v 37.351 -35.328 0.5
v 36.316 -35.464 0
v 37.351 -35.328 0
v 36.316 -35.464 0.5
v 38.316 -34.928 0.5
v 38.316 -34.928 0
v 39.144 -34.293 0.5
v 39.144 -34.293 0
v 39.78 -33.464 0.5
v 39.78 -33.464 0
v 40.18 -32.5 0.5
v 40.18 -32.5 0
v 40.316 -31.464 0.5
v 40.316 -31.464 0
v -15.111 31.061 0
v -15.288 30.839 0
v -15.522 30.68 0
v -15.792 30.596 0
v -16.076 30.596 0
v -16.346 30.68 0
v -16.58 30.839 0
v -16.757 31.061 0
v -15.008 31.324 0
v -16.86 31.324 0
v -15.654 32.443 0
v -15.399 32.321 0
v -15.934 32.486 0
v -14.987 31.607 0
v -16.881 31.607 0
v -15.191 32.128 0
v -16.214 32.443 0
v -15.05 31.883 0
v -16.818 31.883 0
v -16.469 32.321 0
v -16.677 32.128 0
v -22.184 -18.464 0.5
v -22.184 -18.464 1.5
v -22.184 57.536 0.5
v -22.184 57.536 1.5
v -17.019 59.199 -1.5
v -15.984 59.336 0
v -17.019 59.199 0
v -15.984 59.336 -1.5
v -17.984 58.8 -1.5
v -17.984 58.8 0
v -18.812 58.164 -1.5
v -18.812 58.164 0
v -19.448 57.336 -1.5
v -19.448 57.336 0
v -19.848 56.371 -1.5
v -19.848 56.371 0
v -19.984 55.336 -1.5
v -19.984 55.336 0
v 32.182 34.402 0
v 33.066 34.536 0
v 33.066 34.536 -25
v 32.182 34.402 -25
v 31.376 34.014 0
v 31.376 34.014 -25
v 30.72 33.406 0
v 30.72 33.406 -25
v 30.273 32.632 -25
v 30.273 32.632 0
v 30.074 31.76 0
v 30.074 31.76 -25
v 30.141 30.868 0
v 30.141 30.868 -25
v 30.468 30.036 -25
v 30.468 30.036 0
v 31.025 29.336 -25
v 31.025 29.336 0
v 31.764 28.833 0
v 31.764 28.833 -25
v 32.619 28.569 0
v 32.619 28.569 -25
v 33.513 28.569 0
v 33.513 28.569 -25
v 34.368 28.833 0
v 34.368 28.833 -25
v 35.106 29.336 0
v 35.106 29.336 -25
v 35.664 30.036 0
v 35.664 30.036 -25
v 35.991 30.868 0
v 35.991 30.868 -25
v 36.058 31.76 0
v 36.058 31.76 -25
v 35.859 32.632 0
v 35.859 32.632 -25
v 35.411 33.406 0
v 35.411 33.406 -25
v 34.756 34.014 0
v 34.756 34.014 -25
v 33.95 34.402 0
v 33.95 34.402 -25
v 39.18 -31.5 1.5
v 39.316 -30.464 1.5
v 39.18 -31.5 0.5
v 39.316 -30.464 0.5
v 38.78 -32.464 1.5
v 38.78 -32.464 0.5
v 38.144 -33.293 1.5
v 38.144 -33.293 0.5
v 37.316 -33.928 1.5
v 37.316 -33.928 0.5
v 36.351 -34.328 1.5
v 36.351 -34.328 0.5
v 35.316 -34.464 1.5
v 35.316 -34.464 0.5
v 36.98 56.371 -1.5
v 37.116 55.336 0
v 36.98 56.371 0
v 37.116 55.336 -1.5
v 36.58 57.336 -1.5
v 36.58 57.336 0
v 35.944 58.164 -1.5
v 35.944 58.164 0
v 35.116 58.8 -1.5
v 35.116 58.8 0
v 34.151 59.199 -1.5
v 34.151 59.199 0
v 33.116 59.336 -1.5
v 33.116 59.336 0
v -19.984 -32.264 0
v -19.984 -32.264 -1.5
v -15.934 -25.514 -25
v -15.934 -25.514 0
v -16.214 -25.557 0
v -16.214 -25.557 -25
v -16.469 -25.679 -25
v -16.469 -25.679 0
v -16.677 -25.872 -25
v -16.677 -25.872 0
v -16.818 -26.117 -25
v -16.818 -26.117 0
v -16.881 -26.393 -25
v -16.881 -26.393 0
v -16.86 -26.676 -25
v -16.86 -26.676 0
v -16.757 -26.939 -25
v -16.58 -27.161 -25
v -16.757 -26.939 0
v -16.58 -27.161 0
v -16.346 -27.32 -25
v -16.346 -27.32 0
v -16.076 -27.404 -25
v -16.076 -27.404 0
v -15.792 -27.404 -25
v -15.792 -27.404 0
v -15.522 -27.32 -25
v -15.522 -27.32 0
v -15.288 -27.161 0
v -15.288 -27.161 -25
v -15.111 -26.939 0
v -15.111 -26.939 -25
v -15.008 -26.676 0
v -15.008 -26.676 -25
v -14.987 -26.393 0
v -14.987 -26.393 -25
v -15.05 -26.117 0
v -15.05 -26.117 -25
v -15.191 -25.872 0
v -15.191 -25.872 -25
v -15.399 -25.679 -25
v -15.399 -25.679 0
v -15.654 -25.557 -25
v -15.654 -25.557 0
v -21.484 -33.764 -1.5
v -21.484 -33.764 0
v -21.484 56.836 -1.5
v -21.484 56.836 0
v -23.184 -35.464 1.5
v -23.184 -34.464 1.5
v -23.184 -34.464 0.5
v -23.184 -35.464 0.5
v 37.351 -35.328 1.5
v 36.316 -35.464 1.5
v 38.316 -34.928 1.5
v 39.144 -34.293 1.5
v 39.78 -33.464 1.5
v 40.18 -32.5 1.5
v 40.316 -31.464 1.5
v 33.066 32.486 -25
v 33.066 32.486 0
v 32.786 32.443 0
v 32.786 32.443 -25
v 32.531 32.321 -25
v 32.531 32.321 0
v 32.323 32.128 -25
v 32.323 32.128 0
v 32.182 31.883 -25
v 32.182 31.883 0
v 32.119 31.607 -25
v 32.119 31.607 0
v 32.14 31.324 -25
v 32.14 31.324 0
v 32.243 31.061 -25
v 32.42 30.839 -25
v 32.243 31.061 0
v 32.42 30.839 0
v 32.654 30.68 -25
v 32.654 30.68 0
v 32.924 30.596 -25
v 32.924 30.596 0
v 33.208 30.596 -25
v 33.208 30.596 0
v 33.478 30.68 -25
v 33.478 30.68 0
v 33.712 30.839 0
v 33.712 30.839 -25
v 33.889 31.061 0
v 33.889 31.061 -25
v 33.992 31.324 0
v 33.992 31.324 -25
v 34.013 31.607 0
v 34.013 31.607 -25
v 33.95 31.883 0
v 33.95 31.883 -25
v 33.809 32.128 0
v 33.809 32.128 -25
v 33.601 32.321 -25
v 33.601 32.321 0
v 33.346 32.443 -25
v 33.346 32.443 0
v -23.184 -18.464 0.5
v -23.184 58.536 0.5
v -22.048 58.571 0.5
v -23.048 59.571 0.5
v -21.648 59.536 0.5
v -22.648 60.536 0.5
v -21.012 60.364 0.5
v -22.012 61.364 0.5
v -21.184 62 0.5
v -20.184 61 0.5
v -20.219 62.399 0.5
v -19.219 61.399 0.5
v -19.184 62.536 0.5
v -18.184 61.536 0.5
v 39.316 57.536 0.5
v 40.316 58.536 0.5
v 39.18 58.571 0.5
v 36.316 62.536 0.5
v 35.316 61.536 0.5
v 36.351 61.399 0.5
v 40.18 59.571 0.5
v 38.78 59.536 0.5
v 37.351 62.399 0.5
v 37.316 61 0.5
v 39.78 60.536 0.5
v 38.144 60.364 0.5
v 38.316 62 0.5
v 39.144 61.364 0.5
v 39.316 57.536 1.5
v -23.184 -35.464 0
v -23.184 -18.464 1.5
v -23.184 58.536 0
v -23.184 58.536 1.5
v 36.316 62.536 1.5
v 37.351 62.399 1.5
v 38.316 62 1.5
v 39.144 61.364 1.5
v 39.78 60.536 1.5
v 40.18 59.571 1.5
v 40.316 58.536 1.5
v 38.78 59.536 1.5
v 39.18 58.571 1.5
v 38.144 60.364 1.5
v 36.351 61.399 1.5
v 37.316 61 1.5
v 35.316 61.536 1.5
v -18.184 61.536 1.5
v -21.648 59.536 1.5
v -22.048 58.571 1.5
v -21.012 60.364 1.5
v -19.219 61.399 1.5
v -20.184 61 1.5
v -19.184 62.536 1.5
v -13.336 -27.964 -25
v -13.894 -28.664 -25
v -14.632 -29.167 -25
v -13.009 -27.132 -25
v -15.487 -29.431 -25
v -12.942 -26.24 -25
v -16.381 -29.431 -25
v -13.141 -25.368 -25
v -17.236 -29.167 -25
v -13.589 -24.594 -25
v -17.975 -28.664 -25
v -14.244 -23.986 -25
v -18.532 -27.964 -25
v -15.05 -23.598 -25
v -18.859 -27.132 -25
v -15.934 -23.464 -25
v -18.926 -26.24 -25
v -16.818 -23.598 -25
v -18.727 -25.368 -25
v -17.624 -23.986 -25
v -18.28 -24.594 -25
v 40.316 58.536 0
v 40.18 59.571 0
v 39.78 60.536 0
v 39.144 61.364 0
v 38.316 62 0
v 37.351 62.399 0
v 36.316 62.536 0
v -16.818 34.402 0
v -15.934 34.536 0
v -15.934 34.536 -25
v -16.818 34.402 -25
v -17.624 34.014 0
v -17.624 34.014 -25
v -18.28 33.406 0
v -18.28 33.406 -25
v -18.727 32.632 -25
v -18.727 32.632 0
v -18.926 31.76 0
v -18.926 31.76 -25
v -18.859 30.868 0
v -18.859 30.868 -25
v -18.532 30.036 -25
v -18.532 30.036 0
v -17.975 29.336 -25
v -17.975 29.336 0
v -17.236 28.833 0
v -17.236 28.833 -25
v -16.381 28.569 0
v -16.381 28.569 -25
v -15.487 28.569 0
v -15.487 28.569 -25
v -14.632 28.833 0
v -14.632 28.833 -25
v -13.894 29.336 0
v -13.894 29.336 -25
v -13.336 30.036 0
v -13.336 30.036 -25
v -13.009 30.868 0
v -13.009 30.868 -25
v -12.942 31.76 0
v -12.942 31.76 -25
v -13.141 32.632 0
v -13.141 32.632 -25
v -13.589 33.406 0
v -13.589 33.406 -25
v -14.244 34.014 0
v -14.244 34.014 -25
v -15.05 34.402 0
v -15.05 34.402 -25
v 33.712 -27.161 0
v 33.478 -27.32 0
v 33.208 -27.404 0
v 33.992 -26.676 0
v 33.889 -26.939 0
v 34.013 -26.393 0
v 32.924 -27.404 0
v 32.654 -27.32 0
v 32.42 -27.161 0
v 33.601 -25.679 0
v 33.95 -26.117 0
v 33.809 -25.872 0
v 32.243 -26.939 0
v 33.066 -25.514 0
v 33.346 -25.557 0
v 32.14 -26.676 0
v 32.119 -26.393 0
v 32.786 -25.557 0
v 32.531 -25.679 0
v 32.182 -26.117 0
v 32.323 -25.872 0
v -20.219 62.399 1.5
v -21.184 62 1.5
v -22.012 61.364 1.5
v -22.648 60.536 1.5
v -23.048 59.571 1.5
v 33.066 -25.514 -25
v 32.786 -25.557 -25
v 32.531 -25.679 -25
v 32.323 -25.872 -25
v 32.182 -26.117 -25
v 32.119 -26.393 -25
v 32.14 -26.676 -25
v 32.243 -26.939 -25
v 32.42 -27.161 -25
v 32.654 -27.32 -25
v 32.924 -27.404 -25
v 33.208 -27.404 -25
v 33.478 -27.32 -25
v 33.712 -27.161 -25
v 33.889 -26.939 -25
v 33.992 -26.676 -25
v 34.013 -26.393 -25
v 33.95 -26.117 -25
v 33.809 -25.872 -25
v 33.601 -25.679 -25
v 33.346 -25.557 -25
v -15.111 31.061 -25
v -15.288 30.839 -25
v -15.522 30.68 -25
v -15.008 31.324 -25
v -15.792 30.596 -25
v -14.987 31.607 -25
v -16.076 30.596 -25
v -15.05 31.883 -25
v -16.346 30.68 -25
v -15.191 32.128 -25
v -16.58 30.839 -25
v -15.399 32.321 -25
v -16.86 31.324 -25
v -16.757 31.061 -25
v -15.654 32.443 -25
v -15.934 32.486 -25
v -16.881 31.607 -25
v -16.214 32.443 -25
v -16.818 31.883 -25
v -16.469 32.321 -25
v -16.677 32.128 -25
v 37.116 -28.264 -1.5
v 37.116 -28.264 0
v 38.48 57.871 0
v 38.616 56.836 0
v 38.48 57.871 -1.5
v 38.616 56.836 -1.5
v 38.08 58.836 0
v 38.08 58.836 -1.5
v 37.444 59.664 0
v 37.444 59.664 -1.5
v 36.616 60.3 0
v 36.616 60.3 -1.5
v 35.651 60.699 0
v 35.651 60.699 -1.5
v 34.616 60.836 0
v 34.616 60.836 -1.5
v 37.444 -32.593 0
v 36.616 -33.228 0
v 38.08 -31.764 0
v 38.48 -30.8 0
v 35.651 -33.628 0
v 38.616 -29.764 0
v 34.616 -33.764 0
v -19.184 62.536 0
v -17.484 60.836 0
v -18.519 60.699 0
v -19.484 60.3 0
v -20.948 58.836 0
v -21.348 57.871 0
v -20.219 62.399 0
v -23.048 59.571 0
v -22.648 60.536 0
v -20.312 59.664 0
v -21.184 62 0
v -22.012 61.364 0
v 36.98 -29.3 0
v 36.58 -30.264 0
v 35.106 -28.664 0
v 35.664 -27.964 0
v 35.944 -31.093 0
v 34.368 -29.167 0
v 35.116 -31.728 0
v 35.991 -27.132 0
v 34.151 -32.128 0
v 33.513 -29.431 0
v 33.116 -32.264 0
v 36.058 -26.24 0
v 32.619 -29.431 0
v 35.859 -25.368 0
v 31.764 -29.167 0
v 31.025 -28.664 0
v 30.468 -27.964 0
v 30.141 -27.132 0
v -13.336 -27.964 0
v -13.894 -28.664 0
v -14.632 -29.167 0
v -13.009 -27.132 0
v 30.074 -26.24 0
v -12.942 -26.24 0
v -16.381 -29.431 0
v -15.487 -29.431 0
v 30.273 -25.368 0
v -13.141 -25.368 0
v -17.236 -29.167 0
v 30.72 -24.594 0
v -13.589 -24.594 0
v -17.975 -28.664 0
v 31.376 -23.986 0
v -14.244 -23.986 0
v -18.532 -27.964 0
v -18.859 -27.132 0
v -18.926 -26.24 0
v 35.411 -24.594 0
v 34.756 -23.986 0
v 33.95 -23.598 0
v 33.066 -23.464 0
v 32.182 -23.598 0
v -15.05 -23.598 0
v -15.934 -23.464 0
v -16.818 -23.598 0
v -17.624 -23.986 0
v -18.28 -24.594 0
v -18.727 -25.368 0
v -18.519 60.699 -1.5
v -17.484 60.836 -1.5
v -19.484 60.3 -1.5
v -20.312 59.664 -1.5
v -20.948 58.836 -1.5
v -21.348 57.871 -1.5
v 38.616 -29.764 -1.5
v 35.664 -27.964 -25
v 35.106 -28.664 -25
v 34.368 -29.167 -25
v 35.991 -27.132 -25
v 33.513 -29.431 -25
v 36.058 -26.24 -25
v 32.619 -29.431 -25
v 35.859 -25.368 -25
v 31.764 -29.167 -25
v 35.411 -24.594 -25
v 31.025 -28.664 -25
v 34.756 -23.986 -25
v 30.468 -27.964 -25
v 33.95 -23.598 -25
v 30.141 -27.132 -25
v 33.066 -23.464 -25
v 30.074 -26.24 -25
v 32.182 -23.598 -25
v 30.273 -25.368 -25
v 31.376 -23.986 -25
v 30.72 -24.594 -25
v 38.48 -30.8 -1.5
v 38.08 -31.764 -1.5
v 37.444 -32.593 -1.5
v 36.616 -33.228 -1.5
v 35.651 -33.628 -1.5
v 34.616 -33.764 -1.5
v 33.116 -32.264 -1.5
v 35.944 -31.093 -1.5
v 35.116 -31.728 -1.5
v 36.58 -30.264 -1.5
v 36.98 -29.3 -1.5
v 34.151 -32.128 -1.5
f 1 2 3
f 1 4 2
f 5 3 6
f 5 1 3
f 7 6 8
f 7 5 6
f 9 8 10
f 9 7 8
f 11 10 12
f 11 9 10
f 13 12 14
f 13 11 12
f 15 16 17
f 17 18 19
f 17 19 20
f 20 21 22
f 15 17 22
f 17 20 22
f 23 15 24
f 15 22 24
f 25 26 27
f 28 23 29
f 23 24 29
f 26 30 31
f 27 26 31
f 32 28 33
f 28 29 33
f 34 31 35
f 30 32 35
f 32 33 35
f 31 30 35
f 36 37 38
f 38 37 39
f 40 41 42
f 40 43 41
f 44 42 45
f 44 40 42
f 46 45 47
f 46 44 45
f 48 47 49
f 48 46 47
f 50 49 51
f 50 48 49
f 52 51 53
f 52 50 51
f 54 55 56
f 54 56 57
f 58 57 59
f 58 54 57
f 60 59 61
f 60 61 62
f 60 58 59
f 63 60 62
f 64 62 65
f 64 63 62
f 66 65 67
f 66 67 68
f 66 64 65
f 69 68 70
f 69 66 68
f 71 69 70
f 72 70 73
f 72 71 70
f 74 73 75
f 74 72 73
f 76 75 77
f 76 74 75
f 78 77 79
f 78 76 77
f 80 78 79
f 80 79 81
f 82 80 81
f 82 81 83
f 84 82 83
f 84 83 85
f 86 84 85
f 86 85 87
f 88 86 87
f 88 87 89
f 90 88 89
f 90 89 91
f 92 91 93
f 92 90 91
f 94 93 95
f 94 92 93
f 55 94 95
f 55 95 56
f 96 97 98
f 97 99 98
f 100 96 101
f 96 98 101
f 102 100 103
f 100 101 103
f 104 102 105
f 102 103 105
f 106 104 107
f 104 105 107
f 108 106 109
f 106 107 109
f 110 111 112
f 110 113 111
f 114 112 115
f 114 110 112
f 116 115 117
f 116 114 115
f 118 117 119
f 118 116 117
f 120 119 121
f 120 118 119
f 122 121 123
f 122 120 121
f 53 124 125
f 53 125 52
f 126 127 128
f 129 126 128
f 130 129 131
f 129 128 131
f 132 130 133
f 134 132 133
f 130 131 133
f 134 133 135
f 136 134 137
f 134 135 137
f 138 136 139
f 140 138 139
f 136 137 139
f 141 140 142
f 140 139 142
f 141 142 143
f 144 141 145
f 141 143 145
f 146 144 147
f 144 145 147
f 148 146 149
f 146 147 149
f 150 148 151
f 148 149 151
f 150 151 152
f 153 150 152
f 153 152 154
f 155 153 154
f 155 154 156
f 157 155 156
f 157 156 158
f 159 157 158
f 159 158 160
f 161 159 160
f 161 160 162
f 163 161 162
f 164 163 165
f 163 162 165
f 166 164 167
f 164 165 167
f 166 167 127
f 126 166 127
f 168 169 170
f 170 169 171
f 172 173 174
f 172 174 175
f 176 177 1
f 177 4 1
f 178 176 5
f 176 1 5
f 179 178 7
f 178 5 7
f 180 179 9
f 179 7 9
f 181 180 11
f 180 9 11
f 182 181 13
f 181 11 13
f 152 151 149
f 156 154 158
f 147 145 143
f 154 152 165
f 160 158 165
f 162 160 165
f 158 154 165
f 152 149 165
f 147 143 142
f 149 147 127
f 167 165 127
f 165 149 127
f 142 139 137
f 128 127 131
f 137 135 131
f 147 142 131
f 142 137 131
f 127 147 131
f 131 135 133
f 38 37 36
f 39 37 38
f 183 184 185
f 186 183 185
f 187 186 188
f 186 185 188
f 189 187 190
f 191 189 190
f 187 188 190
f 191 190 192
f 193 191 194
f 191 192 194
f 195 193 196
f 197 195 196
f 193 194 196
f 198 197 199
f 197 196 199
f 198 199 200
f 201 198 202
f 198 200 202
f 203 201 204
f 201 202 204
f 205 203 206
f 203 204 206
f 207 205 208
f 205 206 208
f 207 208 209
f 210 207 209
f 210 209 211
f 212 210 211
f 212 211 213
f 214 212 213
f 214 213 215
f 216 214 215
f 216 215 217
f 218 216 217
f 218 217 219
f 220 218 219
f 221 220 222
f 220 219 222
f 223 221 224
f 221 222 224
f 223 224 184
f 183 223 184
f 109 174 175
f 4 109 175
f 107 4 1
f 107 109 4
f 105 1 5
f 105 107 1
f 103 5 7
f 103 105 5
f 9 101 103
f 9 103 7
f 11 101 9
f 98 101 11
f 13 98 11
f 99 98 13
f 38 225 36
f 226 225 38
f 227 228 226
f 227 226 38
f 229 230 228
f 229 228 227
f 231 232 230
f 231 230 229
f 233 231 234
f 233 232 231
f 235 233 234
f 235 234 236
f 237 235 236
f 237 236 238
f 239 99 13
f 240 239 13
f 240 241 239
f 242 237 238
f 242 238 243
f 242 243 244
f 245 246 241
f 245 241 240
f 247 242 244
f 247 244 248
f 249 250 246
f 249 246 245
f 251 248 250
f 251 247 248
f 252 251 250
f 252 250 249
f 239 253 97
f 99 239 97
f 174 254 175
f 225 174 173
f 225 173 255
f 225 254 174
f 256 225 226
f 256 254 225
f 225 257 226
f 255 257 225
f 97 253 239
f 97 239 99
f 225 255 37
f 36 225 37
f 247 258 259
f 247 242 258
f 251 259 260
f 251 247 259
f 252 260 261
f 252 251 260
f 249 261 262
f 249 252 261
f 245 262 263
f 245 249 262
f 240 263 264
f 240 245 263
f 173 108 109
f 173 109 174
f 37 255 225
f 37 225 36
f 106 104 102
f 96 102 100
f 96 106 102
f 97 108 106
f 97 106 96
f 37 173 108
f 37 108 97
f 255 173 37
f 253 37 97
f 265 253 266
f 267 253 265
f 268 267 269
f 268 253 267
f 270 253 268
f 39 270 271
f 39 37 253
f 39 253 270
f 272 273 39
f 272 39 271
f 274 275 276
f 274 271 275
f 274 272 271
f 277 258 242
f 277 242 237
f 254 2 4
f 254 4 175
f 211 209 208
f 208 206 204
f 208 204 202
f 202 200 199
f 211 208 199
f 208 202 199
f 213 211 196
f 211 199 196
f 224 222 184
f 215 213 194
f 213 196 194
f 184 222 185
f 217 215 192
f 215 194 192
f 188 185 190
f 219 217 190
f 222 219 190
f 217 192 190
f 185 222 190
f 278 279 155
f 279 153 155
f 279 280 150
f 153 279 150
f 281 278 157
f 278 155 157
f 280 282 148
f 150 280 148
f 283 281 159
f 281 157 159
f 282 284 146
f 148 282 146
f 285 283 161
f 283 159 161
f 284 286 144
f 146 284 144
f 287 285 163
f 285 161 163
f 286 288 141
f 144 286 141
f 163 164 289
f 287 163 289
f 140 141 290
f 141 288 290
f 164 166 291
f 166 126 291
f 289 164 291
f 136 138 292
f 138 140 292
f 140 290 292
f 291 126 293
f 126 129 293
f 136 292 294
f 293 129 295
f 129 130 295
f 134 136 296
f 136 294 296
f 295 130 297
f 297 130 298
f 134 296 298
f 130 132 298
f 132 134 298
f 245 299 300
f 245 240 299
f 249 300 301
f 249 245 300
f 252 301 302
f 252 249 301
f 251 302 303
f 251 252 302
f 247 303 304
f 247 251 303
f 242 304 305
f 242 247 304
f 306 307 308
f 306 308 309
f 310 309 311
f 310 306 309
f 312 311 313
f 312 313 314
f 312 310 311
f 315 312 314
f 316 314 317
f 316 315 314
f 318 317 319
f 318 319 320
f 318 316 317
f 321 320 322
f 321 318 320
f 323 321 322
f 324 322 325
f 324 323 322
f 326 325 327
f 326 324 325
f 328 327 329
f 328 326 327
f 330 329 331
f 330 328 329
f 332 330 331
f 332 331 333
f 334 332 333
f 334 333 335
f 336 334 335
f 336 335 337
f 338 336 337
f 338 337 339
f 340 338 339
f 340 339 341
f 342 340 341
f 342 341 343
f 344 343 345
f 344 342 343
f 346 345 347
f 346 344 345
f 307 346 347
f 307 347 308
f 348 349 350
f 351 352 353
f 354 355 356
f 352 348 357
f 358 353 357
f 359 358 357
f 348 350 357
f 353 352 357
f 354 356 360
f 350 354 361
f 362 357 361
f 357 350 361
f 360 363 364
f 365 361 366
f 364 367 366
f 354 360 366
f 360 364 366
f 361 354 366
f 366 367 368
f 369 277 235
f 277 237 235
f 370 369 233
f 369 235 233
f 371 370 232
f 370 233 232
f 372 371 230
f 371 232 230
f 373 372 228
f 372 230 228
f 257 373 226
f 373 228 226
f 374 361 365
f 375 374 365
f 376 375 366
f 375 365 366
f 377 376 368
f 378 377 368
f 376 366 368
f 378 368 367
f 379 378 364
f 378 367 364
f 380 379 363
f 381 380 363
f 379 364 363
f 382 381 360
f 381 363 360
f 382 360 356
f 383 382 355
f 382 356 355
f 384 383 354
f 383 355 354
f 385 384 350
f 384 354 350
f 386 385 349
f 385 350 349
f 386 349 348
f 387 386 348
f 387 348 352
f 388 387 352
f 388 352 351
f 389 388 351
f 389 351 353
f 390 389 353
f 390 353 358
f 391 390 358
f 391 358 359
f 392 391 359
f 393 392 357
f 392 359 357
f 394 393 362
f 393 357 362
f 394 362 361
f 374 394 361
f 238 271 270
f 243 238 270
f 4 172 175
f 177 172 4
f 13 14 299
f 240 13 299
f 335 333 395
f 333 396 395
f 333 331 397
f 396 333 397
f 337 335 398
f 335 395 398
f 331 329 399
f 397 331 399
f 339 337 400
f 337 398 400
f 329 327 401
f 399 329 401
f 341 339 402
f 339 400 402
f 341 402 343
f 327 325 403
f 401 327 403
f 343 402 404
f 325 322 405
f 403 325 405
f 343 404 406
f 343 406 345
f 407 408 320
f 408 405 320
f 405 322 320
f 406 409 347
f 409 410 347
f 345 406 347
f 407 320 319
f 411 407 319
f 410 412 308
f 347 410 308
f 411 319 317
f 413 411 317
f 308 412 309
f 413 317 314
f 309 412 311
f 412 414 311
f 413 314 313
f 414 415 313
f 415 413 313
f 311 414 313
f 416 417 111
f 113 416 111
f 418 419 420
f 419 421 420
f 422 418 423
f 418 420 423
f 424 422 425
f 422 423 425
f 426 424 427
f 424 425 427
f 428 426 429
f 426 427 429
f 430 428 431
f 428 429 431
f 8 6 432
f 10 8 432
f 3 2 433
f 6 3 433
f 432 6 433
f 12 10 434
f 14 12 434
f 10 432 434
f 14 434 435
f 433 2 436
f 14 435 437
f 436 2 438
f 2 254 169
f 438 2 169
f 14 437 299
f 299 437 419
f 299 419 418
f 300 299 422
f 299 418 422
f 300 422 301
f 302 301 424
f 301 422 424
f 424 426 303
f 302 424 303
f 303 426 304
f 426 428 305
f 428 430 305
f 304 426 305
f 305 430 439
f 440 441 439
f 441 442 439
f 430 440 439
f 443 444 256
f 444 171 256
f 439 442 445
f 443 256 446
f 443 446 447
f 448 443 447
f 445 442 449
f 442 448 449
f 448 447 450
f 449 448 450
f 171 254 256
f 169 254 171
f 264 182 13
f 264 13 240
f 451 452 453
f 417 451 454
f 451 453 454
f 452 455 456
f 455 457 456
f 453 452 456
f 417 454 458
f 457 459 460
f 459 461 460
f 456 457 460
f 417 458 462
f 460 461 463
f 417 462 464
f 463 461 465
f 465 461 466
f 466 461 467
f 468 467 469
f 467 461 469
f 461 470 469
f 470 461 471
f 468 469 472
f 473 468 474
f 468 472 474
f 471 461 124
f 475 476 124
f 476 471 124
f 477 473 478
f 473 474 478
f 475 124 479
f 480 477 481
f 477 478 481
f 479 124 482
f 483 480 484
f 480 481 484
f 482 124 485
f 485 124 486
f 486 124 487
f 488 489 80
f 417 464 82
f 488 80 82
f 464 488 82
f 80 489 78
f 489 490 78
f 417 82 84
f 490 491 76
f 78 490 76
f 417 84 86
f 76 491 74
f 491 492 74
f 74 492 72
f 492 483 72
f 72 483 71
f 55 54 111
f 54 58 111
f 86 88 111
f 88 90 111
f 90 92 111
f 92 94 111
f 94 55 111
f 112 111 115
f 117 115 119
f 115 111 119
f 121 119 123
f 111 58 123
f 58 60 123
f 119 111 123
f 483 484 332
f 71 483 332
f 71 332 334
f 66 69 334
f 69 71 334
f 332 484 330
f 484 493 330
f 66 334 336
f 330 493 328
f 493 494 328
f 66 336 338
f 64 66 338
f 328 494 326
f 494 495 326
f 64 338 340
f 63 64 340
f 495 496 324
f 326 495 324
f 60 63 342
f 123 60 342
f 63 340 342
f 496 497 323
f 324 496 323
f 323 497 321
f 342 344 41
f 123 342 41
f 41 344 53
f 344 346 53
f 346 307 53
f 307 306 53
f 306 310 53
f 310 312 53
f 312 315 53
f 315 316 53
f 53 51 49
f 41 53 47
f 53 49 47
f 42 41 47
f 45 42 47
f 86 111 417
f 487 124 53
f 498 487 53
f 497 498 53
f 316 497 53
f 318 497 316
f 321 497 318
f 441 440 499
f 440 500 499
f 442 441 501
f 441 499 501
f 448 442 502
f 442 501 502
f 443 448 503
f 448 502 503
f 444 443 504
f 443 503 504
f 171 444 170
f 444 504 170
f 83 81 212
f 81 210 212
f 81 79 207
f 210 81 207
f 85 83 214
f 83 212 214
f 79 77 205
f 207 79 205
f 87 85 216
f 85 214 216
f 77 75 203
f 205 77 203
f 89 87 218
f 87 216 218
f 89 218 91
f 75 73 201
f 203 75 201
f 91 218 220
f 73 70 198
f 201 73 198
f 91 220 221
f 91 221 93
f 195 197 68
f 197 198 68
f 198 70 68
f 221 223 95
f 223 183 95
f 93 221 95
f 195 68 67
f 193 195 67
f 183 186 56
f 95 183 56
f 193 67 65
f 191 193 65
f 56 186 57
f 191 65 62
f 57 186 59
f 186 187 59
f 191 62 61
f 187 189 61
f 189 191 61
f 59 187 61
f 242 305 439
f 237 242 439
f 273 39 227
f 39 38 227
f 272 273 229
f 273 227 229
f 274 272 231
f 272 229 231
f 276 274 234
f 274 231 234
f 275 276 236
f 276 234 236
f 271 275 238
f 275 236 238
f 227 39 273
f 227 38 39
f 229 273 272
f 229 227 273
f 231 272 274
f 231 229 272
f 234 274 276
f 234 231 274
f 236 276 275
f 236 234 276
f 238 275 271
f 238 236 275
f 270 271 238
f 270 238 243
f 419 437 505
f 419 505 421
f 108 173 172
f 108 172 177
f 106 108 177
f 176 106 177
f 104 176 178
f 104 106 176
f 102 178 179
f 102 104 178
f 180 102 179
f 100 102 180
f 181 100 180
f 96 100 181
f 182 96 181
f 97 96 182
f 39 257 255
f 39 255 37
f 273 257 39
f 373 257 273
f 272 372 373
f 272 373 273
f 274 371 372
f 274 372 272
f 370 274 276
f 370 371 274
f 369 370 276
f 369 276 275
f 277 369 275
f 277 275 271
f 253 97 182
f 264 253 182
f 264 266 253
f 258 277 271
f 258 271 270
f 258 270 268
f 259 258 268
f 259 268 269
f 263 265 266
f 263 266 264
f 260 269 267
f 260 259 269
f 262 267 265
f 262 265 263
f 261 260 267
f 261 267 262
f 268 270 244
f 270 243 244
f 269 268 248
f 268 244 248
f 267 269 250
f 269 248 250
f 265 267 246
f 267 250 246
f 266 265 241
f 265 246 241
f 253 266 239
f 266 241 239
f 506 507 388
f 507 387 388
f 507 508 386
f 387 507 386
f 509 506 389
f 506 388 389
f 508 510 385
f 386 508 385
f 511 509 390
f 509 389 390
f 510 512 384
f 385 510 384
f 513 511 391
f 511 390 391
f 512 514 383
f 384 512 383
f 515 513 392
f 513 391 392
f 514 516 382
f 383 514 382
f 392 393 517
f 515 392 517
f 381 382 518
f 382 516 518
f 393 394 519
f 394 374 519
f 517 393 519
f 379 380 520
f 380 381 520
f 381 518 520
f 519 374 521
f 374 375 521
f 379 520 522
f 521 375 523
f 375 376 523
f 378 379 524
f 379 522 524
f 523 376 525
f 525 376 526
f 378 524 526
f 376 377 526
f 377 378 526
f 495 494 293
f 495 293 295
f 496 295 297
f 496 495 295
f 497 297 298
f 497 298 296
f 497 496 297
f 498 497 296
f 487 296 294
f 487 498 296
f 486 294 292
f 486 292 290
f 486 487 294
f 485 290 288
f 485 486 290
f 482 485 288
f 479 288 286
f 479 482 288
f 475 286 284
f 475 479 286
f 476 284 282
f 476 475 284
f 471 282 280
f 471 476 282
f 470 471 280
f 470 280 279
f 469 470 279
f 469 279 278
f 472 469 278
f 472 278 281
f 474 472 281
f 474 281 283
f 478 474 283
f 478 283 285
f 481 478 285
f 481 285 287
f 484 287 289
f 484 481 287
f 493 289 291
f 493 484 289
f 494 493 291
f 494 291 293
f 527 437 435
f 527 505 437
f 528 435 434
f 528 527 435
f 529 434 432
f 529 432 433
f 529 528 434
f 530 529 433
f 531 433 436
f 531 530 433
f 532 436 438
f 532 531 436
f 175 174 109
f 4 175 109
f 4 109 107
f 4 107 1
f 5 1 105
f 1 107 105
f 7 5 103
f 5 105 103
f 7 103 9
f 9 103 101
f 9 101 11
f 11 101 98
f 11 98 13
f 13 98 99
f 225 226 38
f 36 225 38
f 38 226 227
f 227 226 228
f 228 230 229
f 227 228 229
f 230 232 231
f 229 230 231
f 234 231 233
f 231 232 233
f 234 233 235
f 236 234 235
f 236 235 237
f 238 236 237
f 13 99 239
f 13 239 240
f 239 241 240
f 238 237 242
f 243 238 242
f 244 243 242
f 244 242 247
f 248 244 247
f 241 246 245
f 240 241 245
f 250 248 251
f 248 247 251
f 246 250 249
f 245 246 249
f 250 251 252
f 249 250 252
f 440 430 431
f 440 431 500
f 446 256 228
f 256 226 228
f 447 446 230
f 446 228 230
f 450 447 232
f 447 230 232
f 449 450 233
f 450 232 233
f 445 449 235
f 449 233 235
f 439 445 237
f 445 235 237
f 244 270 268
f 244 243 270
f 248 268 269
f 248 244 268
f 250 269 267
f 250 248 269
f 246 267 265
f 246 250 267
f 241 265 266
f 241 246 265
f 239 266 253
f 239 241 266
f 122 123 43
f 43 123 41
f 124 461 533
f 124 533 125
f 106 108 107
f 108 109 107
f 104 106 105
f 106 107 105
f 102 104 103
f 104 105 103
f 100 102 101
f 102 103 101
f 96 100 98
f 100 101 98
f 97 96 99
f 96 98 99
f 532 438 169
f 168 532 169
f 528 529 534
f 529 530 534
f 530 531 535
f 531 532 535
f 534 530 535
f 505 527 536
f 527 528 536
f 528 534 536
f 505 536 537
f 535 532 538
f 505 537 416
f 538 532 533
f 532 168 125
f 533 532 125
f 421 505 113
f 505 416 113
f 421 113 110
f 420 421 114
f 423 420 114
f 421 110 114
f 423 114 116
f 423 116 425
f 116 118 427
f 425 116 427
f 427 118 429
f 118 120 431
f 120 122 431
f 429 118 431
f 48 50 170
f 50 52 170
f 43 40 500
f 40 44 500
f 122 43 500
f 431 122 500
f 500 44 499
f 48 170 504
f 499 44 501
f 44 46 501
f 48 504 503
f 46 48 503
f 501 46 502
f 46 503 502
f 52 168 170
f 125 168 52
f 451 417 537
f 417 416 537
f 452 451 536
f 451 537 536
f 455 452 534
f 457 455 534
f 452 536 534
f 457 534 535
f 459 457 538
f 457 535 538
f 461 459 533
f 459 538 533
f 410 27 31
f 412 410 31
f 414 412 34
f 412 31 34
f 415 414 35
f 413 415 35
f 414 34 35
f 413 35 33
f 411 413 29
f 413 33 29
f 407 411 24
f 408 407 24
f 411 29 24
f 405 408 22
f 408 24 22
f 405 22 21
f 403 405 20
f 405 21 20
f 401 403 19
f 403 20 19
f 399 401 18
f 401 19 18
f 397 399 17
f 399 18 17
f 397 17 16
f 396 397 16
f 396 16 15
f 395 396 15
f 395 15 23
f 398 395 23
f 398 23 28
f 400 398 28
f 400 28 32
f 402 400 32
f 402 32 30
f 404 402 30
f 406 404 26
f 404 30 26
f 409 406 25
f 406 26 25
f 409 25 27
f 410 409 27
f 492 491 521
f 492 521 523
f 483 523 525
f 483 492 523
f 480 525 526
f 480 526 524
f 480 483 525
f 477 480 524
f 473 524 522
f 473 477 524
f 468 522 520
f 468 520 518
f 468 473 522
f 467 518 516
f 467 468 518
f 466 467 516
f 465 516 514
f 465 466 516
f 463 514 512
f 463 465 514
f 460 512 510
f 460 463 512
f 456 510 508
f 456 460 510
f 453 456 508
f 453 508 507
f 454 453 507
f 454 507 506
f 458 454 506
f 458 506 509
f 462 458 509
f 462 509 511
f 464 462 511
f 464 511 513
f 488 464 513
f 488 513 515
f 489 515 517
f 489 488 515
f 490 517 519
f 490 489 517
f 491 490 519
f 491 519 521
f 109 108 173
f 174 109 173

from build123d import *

# Parameters (mm, degrees)
SKETCH1_W           = 98
SKETCH1_H           = 63.5
BOSS_EXTRUDE1_DEPTH = 1.5
SKETCH1_3_W         = 94.6
SKETCH1_3_H         = 60.1
SKETCH1_3_W_2       = 91.6
SKETCH1_3_H_2       = 57.1
BOSS_EXTRUDE2_DEPTH = 1.5
SKETCH1_5_R         = 3
SKETCH1_5_R_2       = 0.95
BOSS_EXTRUDE3_DEPTH = 25
CUT_EXTRUDE1_DEPTH  = 1
FILLET1_R           = 4
BOSS_EXTRUDE4_DEPTH = 1
FILLET2_R           = 4


with BuildPart() as part:
    # Sketch1 → Boss-Extrude1 (new body)
    with BuildSketch(Plane(origin=(0, 0, 0), x_dir=(0, 1, 0), z_dir=(0, 0, 1))):
        with Locations((13.535644201, -8.565962884)):
            Rectangle(SKETCH1_W, SKETCH1_H)
    extrude(amount=BOSS_EXTRUDE1_DEPTH)

    # Sketch1<3> → Boss-Extrude2 (add)
    with BuildSketch(Plane(origin=(0, 0, 0), x_dir=(0, 1, 0), z_dir=(0, 0, 1))):
        with Locations((13.535644201, -8.565962884)):
            Rectangle(SKETCH1_3_W, SKETCH1_3_H)
        with Locations((13.535644201, -8.565962884)):
            Rectangle(SKETCH1_3_W_2, SKETCH1_3_H_2, mode=Mode.SUBTRACT)
    extrude(amount=-BOSS_EXTRUDE2_DEPTH)

    # Sketch1<5> → Boss-Extrude3 (add)
    with BuildSketch(Plane(origin=(0, 0, 0), x_dir=(0, 1, 0), z_dir=(0, 0, 1))):
        with Locations((31.535644201, -33.065962884)):
            Circle(SKETCH1_5_R)
        with Locations((31.535644201, -33.065962884)):
            Circle(SKETCH1_5_R_2, mode=Mode.SUBTRACT)
        with Locations((31.535644201, 15.934037116)):
            Circle(SKETCH1_5_R)
        with Locations((31.535644201, 15.934037116)):
            Circle(SKETCH1_5_R_2, mode=Mode.SUBTRACT)
        with Locations((-26.464355799, 15.934037116)):
            Circle(SKETCH1_5_R)
        with Locations((-26.464355799, 15.934037116)):
            Circle(SKETCH1_5_R_2, mode=Mode.SUBTRACT)
        with Locations((-26.464355799, -33.065962884)):
            Circle(SKETCH1_5_R)
        with Locations((-26.464355799, -33.065962884)):
            Circle(SKETCH1_5_R_2, mode=Mode.SUBTRACT)
    extrude(amount=-BOSS_EXTRUDE3_DEPTH)

    # Sketch3 → Cut-Extrude1 (cut)
    with BuildSketch(Plane.XY.offset(1.5)):
        Polygon((40.315962884, 62.535644201), (-23.184037116, 62.535644201), (-23.184037116, -18.464355799), (-22.184037116, -18.464355799), (-22.184037116, 61.535644201), (39.315962884, 61.535644201), (39.315962884, -34.464355799), (-22.184037116, -34.464355799), (-23.184037116, -34.464355799), (-23.184037116, -35.464355799), (40.315962884, -35.464355799), align=None)
    extrude(amount=-CUT_EXTRUDE1_DEPTH, mode=Mode.SUBTRACT)

    # Fillet1
    fillet1_edges = [part.edges().sort_by_distance(p)[0] for p in [
        (38.615962884, -33.764355799, -0.75),
        (-21.484037116, 60.835644201, -0.75),
        (38.615962884, 60.835644201, -0.75),
        (-19.984037116, 59.335644201, -0.75),
        (37.115962884, 59.335644201, -0.75),
        (37.115962884, -32.264355799, -0.75),
        (-23.184037116, 62.535644201, 0.25),
        (40.315962884, 62.535644201, 0.25),
        (40.315962884, -35.464355799, 0.25),
        (39.315962884, -34.464355799, 1),
        (39.315962884, 61.535644201, 1),
        (-22.184037116, 61.535644201, 1),
    ]]
    fillet(fillet1_edges, radius=FILLET1_R)


with BuildPart() as body_2:
    # Sketch3<3> → Boss-Extrude4 (new body)
    with BuildSketch(Plane.XY.offset(1.5)):
        Polygon((40.315962884, 62.535644201), (-23.184037116, 62.535644201), (-23.184037116, -18.464355799), (-22.184037116, -18.464355799), (-22.184037116, 61.535644201), (39.315962884, 61.535644201), (39.315962884, -34.464355799), (-22.184037116, -34.464355799), (-23.184037116, -34.464355799), (-23.184037116, -35.464355799), (40.315962884, -35.464355799), align=None)
    extrude(amount=-BOSS_EXTRUDE4_DEPTH)

    # Fillet2
    fillet2_edges = [body_2.edges().sort_by_distance(p)[0] for p in [
        (-22.184037116, 61.535644201, 1),
        (39.315962884, 61.535644201, 1),
        (39.315962884, -34.464355799, 1),
        (40.315962884, -35.464355799, 1),
        (40.315962884, 62.535644201, 1),
        (-23.184037116, 62.535644201, 1),
    ]]
    fillet(fillet2_edges, radius=FILLET2_R)


solid = Compound([part.part, body_2.part])
